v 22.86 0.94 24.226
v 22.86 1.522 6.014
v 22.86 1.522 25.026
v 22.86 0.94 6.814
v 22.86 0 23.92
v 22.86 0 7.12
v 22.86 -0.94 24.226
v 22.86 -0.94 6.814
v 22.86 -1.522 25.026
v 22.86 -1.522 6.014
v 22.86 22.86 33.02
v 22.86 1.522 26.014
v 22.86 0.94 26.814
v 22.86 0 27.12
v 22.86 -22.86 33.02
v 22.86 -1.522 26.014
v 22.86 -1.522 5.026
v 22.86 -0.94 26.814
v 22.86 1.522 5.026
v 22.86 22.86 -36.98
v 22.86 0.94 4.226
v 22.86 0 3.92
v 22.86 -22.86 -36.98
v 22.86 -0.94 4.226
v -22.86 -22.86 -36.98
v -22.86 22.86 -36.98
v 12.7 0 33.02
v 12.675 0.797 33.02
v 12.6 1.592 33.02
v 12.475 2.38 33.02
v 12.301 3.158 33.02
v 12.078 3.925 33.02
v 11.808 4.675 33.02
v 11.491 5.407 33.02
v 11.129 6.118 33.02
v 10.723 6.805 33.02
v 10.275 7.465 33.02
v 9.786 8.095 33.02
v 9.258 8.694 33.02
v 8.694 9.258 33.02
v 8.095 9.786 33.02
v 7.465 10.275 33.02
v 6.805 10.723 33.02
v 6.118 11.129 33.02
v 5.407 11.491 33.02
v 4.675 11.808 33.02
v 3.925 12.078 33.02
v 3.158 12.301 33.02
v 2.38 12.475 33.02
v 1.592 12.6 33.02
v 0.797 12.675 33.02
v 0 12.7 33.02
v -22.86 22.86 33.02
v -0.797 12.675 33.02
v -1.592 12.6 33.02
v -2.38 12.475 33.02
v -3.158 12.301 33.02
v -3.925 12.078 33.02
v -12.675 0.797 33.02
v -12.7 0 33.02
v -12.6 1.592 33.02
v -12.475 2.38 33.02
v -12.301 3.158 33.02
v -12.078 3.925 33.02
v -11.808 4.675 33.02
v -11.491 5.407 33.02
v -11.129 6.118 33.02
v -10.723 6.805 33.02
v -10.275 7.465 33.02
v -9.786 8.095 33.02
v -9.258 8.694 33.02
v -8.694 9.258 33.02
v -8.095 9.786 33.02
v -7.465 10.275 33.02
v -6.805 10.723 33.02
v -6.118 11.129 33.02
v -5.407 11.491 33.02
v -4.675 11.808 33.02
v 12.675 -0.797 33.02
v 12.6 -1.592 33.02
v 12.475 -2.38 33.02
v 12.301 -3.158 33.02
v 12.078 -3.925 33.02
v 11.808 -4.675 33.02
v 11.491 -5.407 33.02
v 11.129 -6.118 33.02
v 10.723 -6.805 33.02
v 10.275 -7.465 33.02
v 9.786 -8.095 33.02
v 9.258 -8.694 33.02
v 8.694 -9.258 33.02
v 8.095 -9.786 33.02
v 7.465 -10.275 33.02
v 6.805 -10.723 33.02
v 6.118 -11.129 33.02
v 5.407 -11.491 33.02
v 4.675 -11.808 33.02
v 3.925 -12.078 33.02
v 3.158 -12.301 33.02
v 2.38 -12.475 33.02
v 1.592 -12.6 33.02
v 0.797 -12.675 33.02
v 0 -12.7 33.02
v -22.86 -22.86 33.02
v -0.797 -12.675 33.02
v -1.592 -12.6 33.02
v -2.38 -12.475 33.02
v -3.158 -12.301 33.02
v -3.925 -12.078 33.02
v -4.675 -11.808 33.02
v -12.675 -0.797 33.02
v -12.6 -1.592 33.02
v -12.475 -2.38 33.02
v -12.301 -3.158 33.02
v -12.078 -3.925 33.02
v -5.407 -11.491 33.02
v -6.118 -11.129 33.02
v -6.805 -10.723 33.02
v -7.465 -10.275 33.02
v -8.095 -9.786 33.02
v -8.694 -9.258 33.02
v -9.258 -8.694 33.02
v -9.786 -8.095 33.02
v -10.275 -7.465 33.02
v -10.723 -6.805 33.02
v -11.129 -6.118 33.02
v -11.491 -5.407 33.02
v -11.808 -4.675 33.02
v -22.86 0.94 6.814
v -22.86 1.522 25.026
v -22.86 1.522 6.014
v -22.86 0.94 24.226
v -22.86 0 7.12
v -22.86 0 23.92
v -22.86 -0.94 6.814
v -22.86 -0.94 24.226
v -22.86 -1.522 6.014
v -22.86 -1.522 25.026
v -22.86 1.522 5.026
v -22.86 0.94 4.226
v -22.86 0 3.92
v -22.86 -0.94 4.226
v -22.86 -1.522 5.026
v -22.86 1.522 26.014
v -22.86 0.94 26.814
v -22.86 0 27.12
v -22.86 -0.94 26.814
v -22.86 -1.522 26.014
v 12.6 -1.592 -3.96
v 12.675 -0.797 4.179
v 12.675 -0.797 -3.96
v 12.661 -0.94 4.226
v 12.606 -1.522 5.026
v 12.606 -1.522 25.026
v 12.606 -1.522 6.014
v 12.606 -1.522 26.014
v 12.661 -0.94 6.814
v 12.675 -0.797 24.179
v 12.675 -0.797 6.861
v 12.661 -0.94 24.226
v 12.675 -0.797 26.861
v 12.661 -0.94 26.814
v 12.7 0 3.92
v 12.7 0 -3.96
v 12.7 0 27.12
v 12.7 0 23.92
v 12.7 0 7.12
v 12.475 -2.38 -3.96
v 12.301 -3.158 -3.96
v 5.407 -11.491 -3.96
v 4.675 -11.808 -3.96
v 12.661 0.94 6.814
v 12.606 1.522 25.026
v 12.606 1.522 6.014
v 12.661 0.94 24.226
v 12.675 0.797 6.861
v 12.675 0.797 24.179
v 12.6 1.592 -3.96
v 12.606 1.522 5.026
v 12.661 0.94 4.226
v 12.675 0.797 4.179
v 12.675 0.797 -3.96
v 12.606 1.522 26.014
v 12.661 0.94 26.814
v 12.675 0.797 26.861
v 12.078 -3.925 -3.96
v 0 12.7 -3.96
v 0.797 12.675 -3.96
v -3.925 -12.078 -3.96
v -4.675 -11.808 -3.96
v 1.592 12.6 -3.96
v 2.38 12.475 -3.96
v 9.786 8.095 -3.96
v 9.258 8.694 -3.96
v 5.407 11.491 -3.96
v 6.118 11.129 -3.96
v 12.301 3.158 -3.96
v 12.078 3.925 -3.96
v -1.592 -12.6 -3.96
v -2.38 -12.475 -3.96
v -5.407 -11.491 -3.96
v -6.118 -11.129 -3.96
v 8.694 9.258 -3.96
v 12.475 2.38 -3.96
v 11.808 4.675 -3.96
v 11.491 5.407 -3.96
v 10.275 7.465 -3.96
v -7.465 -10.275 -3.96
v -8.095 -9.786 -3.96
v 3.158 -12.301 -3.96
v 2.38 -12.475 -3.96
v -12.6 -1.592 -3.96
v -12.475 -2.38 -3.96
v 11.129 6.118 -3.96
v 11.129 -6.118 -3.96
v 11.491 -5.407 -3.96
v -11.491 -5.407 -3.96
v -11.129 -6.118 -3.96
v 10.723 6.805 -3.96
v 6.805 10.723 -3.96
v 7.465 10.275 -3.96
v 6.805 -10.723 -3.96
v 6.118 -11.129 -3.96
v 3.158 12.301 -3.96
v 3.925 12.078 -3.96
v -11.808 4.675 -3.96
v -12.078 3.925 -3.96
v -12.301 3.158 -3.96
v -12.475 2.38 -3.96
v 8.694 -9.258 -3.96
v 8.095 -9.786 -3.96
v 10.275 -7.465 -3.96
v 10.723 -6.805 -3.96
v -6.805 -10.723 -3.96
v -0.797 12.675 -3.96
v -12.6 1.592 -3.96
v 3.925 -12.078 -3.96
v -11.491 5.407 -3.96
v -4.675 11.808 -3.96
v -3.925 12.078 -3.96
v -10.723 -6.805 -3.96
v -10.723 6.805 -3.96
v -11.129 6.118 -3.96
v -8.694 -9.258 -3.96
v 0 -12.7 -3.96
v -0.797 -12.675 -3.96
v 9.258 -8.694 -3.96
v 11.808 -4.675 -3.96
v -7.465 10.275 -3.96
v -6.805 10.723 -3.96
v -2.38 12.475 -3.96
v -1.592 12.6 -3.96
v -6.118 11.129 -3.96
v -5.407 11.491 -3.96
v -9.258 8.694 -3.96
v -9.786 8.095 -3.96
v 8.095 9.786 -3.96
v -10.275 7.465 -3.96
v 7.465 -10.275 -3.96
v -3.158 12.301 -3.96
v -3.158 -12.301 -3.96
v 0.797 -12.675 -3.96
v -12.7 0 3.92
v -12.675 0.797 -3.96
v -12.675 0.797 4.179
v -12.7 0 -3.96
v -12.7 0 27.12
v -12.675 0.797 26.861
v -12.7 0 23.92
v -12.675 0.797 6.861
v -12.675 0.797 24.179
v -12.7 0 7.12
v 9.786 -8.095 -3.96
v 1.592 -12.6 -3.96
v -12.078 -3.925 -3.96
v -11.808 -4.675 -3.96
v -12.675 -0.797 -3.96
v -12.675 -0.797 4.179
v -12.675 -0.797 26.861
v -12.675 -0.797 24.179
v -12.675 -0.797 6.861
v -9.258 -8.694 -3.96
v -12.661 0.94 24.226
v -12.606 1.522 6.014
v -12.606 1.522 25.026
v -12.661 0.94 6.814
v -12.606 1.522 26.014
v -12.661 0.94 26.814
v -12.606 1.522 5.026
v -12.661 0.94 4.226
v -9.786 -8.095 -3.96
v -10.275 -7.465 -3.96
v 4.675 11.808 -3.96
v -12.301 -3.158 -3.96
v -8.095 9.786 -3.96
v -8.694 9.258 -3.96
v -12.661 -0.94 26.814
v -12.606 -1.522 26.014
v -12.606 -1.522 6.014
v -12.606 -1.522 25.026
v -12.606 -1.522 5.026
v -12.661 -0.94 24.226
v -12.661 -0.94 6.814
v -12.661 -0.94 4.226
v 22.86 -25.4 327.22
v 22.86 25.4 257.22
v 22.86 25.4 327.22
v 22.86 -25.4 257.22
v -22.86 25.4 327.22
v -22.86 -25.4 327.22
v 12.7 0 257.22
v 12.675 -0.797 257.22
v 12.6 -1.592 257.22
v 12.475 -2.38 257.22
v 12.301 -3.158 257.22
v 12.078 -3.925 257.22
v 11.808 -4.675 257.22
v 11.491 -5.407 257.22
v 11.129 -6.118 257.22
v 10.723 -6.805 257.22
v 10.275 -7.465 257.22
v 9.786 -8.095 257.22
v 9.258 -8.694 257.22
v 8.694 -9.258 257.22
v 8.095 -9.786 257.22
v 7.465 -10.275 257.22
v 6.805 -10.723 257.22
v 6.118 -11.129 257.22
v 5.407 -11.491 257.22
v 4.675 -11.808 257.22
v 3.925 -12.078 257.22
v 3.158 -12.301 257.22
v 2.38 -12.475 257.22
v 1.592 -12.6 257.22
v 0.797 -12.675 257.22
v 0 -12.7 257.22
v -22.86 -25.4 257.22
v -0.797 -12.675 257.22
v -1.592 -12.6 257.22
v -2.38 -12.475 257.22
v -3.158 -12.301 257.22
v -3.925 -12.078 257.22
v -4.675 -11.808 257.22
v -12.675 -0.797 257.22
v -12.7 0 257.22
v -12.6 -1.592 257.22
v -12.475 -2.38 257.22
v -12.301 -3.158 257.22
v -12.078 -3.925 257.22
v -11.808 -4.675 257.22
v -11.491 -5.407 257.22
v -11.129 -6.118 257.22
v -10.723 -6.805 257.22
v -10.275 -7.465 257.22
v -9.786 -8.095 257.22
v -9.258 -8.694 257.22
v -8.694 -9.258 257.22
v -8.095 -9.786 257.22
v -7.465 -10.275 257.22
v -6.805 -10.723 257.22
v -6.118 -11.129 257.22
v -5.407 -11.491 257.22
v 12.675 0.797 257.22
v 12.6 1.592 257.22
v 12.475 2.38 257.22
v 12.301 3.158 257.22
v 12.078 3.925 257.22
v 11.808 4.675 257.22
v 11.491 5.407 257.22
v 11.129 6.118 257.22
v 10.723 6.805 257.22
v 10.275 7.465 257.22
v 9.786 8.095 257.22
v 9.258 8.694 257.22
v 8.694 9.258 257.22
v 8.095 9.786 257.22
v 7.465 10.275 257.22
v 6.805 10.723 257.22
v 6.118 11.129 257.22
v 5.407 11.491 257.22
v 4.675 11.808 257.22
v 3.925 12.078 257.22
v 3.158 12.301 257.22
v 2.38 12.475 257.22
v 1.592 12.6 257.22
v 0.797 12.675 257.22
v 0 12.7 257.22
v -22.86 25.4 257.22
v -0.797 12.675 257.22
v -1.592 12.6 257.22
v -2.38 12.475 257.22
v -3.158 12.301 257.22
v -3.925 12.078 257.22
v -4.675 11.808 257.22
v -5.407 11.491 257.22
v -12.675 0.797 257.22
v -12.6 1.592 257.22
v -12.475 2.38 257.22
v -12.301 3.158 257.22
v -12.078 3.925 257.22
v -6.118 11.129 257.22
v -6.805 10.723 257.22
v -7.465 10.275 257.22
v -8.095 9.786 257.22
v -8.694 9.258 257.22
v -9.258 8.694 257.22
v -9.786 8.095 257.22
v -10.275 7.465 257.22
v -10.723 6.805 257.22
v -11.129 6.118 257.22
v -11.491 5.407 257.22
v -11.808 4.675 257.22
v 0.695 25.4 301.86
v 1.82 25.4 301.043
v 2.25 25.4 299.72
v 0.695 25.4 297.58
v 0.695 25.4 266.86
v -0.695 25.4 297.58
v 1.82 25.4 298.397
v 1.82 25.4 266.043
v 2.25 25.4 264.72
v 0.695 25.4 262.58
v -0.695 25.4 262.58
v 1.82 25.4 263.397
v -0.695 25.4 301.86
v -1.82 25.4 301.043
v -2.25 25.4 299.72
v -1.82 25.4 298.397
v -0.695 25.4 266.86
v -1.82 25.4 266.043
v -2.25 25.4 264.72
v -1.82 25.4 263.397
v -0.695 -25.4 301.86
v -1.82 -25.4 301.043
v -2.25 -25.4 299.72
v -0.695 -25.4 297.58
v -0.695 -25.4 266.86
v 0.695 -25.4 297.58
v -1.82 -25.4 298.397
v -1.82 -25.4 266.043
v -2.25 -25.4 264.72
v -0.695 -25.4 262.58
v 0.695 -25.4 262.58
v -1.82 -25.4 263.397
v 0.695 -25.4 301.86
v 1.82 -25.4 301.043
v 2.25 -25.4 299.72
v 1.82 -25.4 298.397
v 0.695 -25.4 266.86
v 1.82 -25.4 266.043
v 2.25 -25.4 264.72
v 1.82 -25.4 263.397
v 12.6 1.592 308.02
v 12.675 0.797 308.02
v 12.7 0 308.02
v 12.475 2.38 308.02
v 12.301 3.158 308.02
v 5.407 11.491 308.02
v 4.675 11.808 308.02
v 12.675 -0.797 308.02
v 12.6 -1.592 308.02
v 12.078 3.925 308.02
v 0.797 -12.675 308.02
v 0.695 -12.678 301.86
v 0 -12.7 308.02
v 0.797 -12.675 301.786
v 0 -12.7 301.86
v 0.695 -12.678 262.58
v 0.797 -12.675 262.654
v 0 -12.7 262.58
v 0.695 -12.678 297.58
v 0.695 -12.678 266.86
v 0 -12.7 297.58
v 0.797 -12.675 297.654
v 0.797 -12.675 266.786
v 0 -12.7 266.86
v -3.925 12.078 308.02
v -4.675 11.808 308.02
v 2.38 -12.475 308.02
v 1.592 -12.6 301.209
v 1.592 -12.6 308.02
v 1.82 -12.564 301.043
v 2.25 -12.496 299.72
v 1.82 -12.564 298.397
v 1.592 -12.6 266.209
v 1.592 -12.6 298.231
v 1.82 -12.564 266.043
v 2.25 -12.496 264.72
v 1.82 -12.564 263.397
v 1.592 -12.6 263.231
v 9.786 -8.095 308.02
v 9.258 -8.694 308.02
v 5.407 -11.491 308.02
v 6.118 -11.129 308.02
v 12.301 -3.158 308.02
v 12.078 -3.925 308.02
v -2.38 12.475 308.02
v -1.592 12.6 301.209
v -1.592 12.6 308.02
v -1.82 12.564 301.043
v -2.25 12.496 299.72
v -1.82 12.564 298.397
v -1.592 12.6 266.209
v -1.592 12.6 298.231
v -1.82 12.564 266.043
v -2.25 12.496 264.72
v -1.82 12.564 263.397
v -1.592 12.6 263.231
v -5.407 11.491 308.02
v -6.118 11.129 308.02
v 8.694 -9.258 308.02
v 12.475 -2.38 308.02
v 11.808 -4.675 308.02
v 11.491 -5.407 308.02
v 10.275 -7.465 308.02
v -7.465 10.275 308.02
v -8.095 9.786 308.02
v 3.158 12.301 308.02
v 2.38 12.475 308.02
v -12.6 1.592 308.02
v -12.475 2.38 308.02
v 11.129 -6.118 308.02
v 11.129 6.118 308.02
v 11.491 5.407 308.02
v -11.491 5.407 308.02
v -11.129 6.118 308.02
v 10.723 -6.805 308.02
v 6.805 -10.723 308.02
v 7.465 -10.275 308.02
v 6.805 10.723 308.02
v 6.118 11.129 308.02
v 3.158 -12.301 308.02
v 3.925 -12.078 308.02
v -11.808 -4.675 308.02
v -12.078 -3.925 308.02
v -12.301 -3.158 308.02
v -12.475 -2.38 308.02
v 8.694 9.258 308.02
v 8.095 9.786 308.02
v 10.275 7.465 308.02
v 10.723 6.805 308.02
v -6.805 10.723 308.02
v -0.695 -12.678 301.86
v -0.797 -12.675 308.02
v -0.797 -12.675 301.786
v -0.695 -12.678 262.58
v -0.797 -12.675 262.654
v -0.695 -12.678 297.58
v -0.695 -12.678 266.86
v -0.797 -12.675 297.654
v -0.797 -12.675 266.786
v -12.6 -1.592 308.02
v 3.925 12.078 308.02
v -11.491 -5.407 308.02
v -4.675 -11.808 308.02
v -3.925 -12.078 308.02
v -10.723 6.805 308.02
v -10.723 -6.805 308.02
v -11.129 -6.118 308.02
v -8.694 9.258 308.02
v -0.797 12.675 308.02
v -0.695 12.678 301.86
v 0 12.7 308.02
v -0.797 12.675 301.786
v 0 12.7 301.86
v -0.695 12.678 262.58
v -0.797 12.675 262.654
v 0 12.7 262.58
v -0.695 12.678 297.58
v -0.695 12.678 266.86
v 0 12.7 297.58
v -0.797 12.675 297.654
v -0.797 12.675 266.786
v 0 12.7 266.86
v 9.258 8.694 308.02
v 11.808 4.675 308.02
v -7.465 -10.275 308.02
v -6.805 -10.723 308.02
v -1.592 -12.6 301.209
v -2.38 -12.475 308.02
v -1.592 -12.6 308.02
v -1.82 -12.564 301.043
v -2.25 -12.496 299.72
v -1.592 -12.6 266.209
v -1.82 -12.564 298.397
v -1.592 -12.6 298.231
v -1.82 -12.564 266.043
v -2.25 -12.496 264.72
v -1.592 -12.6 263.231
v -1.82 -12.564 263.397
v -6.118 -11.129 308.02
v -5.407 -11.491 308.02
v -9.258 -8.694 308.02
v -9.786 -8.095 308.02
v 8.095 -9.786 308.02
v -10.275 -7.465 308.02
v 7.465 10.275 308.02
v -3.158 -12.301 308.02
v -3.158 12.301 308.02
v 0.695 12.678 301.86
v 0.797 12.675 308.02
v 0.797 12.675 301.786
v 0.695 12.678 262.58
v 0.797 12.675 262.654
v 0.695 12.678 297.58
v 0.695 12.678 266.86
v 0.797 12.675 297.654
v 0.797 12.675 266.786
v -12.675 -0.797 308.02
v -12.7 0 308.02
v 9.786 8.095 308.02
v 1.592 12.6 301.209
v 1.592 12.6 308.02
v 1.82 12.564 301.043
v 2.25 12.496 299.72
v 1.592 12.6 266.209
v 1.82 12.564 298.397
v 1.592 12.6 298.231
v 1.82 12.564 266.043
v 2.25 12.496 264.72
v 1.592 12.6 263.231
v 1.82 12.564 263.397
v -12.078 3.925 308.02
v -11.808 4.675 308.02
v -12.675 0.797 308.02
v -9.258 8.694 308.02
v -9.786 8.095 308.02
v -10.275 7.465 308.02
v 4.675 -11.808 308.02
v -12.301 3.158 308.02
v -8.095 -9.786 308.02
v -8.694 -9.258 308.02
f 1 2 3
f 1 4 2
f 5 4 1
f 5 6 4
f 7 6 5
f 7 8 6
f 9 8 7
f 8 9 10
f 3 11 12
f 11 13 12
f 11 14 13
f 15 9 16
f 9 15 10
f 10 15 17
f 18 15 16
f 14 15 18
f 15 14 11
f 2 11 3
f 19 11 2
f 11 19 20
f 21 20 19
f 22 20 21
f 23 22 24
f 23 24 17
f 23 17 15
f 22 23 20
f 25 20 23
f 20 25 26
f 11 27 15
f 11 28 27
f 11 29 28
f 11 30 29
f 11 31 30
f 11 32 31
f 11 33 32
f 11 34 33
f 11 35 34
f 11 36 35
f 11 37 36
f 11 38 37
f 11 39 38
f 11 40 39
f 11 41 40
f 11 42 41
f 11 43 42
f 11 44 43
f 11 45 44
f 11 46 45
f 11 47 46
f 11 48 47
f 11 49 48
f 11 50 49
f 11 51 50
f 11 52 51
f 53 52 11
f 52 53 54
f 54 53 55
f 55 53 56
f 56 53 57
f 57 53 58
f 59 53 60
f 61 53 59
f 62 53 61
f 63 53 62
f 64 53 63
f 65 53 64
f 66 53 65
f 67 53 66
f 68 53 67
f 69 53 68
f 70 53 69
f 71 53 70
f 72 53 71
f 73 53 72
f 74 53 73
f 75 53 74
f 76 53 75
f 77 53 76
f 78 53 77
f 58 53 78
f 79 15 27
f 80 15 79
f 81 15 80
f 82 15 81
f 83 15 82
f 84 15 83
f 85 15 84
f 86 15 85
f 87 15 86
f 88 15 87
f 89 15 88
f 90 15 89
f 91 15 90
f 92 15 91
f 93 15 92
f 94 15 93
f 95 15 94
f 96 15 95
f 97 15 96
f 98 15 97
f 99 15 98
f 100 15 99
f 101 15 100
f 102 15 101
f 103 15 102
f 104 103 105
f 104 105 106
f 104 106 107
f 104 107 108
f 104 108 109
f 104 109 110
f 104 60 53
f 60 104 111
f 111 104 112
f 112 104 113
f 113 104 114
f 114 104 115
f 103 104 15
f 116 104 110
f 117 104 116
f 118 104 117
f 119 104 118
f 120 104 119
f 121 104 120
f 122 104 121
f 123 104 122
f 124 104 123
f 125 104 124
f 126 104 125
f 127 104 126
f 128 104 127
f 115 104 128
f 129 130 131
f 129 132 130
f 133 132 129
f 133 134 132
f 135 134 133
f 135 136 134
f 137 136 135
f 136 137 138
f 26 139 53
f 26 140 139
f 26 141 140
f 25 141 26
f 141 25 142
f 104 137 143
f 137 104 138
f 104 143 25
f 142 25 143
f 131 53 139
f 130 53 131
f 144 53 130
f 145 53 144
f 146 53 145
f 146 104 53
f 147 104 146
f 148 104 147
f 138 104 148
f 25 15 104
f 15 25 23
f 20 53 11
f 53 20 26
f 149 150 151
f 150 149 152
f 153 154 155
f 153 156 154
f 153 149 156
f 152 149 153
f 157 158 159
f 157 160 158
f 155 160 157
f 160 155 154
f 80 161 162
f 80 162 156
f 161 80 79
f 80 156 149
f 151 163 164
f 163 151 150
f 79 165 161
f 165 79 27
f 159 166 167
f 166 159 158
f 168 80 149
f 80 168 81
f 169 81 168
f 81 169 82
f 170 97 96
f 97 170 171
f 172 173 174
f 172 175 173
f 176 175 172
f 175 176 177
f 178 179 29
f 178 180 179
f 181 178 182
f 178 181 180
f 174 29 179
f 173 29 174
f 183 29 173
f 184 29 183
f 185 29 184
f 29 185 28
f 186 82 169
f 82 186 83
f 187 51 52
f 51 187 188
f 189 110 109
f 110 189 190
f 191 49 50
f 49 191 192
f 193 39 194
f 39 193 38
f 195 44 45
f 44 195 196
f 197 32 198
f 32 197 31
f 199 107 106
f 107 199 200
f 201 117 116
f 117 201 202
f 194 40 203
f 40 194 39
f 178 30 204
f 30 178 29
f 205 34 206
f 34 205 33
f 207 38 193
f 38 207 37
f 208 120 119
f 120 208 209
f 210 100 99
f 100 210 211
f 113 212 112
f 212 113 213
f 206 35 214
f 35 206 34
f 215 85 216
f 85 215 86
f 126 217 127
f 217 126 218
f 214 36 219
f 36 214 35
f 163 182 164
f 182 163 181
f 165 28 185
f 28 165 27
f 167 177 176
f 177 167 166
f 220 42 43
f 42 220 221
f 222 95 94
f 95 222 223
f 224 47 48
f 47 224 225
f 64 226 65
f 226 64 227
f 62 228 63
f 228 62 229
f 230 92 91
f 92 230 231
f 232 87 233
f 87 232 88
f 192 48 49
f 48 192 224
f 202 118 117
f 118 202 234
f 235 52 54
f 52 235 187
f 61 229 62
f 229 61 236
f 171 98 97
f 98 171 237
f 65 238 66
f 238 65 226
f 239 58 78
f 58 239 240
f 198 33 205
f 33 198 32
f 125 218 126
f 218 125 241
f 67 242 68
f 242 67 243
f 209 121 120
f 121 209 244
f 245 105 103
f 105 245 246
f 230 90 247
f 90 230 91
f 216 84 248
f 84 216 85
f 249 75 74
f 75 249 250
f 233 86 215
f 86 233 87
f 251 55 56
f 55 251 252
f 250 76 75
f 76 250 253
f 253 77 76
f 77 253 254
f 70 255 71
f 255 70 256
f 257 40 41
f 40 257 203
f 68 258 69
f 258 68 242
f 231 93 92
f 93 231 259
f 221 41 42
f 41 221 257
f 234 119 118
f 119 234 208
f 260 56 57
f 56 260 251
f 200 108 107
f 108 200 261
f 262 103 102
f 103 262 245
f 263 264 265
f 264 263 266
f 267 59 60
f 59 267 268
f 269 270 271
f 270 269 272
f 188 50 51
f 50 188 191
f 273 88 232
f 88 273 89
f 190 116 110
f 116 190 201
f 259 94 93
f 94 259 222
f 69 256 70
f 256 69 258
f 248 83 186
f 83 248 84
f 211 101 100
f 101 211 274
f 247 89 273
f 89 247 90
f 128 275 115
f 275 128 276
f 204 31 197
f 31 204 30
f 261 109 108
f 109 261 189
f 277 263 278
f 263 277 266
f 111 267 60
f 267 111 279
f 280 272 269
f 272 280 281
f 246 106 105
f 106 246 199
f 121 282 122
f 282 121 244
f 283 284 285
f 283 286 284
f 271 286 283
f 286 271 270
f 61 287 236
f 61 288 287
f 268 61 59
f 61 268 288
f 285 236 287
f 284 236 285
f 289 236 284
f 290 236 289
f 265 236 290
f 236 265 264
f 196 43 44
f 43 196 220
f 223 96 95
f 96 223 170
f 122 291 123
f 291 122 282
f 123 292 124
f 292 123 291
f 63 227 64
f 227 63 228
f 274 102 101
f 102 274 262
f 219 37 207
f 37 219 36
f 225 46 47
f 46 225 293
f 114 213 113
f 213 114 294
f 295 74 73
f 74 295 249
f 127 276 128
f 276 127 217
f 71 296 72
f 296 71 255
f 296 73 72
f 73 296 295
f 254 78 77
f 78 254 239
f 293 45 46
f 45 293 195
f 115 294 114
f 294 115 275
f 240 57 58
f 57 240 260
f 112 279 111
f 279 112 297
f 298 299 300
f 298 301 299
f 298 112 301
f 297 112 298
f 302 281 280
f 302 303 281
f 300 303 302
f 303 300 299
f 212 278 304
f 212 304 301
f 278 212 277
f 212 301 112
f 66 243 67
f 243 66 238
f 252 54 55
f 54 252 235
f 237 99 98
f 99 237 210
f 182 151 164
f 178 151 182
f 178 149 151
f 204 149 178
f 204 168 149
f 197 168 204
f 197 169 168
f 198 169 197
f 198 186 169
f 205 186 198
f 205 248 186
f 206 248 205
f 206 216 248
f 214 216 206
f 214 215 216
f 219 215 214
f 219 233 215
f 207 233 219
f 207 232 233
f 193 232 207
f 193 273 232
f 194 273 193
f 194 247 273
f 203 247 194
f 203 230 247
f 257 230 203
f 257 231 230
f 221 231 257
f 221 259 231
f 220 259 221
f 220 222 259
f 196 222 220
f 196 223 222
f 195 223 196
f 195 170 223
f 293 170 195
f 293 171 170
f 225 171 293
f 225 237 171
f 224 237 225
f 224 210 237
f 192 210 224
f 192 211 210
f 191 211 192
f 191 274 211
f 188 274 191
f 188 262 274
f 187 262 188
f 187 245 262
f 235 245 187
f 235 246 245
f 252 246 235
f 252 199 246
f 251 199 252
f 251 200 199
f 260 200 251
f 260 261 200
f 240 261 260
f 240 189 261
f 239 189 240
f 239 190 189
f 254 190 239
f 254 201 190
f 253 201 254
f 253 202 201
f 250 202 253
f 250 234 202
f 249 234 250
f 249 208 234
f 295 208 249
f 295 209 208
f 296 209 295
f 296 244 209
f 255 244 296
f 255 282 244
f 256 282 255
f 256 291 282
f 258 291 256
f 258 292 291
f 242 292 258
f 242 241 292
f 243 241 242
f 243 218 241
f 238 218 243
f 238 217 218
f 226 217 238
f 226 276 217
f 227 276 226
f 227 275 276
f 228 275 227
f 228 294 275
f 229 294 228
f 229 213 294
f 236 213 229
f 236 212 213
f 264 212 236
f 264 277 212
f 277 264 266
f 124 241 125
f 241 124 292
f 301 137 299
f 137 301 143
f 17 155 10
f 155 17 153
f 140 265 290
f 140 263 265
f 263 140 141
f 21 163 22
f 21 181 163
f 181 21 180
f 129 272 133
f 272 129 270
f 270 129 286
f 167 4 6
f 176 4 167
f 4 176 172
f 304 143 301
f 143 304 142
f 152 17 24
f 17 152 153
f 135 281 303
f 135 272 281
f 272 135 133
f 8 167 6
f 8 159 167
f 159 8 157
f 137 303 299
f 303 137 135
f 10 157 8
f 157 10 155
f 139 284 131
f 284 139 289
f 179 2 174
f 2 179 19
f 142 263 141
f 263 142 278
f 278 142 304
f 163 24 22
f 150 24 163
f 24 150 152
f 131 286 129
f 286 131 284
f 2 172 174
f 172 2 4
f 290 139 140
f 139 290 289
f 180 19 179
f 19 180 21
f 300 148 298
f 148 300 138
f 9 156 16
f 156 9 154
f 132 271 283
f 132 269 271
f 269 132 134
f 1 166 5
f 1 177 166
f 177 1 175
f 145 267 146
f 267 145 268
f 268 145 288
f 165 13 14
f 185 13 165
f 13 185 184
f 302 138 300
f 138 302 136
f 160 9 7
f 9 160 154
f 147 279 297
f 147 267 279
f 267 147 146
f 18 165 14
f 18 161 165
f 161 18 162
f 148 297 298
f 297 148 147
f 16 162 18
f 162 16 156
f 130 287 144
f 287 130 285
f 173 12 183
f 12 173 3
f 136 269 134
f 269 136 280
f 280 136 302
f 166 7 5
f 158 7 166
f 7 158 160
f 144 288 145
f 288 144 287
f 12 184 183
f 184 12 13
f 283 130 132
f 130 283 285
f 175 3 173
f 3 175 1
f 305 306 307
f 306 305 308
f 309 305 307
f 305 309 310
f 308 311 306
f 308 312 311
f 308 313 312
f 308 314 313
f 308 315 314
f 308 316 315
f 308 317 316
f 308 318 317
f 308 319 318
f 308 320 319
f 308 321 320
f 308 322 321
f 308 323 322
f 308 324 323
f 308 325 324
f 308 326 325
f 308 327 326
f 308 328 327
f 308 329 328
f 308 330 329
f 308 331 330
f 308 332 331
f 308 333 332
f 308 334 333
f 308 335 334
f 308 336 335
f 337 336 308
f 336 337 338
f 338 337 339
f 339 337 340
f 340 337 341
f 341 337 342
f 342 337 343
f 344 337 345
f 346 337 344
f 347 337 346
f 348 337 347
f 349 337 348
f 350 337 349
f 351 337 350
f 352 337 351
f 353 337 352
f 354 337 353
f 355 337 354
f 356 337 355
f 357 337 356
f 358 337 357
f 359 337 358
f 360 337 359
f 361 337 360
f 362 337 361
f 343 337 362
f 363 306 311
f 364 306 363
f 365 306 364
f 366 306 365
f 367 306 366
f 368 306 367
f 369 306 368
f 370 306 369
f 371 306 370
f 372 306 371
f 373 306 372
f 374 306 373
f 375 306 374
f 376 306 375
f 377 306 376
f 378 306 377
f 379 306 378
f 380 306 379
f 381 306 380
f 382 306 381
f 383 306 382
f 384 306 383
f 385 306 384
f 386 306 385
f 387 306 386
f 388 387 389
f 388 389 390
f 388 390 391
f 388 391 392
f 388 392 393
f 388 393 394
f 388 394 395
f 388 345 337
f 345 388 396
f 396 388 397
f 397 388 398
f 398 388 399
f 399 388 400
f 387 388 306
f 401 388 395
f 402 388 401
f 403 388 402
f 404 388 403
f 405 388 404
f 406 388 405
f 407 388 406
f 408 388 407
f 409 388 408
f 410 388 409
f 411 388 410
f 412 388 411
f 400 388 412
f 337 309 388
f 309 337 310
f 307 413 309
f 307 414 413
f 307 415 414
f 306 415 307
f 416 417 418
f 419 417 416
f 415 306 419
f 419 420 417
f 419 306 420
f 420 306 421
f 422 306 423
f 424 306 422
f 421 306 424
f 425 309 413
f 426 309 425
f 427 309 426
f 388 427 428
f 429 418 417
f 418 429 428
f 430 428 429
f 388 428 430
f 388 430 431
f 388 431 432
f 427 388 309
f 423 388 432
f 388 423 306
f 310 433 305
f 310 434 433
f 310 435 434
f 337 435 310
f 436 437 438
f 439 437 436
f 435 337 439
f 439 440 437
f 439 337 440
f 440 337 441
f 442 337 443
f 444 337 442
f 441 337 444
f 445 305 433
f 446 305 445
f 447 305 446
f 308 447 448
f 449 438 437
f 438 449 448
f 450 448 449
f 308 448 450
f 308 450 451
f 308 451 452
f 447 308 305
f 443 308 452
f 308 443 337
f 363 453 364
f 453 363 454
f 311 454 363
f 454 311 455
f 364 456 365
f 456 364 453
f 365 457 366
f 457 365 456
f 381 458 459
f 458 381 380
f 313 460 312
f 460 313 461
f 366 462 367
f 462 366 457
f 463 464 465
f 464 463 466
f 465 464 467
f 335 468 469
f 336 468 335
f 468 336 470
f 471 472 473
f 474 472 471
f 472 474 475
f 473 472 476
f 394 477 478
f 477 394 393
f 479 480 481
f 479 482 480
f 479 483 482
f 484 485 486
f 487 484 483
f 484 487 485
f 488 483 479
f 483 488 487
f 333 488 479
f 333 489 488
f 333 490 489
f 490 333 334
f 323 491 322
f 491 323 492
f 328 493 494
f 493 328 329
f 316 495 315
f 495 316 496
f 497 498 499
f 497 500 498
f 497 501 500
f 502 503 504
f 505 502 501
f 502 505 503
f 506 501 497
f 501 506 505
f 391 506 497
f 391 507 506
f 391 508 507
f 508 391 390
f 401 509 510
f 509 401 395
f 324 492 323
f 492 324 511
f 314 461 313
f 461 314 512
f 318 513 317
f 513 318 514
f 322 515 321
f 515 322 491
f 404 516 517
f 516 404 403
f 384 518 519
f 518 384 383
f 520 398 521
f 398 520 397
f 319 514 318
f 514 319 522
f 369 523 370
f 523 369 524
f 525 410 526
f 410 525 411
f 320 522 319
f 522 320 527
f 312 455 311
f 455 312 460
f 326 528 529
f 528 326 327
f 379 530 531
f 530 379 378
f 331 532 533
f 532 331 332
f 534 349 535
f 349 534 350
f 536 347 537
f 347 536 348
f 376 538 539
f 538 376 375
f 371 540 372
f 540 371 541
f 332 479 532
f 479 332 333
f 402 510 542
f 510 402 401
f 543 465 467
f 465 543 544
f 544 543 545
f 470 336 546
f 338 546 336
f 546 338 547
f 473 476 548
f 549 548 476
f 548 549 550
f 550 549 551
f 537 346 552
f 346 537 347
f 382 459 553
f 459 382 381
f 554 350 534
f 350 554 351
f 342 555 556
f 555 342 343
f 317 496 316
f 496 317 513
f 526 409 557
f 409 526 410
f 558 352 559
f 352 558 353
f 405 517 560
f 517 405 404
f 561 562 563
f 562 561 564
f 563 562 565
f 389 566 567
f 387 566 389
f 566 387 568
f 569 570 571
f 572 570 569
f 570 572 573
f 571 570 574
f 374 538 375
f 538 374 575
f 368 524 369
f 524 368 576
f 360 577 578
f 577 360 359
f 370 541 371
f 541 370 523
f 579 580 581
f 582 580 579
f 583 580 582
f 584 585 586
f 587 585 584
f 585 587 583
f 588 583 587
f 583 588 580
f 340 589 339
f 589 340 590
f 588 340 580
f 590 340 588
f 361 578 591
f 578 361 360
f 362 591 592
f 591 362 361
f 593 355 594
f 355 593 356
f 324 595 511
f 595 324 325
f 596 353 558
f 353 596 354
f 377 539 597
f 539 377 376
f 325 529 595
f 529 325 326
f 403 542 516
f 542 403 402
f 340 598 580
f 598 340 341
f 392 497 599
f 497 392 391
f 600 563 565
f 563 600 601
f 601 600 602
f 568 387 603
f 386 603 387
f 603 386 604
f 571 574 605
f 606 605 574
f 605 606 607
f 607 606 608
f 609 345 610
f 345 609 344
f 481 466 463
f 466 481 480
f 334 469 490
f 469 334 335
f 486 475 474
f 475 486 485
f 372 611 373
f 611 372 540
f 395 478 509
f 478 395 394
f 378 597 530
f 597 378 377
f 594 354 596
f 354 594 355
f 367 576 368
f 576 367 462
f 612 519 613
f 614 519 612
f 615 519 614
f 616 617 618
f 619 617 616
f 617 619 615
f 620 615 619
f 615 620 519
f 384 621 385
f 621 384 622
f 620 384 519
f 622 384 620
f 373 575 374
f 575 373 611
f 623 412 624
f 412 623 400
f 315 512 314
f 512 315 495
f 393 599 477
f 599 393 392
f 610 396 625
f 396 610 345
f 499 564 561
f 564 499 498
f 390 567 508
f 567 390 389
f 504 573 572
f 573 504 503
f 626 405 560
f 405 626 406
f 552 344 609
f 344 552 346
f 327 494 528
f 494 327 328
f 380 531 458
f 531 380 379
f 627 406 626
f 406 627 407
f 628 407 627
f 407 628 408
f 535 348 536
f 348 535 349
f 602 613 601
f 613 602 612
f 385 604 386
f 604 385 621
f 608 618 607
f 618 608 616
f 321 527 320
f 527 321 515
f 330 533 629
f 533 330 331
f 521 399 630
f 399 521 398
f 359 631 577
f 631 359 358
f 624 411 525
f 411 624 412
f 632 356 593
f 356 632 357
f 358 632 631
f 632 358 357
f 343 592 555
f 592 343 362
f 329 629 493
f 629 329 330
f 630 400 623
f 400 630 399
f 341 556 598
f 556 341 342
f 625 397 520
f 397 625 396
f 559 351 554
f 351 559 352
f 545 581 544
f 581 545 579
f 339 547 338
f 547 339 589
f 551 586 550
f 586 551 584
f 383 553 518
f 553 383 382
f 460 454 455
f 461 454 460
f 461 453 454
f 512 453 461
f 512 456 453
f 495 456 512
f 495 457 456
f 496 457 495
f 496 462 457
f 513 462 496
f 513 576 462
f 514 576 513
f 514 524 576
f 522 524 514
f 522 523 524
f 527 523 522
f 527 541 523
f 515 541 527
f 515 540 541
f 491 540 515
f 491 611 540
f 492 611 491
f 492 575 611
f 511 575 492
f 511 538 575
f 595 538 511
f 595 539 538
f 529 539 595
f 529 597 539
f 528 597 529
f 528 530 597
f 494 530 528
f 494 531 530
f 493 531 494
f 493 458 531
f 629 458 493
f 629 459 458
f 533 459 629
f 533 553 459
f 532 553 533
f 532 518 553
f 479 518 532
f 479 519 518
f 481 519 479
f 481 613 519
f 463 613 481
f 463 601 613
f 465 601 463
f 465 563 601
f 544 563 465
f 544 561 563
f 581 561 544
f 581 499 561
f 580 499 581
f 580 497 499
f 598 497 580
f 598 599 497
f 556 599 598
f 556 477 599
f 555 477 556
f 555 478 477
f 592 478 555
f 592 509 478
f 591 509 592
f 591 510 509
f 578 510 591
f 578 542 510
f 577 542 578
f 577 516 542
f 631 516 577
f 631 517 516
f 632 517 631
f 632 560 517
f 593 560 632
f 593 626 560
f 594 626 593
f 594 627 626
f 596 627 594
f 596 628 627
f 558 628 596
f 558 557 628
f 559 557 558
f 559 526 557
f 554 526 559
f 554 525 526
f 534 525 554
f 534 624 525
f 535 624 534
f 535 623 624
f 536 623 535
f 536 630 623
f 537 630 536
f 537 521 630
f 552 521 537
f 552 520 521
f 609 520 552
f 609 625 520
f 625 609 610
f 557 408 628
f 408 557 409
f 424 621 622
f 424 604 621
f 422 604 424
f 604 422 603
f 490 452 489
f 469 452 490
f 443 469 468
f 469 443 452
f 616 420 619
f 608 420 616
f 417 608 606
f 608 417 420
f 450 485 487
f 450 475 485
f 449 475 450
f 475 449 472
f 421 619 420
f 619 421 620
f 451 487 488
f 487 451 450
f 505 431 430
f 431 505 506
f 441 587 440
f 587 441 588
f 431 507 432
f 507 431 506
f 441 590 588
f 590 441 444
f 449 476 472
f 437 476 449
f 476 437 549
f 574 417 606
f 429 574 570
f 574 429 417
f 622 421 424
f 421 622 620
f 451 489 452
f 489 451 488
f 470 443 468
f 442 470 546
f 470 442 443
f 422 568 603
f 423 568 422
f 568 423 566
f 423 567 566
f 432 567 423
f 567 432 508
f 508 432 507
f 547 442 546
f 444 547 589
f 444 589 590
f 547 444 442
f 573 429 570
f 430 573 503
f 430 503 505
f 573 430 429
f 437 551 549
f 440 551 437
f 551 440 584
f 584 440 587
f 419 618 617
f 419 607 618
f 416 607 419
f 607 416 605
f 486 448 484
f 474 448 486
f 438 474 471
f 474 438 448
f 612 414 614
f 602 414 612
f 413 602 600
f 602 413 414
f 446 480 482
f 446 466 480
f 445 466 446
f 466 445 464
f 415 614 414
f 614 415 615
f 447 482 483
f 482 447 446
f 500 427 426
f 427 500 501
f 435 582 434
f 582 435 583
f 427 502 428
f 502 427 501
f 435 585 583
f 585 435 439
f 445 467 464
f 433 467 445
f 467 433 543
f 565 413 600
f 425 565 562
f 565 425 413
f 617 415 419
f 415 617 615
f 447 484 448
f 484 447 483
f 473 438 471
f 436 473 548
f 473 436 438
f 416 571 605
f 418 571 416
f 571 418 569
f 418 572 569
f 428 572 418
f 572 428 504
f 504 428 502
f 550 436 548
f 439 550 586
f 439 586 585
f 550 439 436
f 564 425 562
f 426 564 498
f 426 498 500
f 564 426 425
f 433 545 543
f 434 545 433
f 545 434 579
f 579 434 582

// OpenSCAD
// file: ../Parameters.scad
//Main tube diameter - hole [mm]
main_tube_outer_diameter = 25.4;
main_tube_inner_diameter = 23.5;

//Tube for undercarriage - hole [mm]
tube_for_undercarriage_outer_diameter = 10.6;
tube_for_undercarriage_inner_diameter = 6;
global_clearance = 0.5;


//umístění podvozkových trubek

second_undercarriage_hole = main_tube_outer_diameter*2 + main_tube_outer_diameter/5 + main_tube_outer_diameter/2 + 170 + 160;

// Parameters of tube couplings
coupling_wall_thickness = main_tube_outer_diameter/5;  //width of coupling walls 
thickness_between_tubes = main_tube_outer_diameter/10;    // minimum distance between tubes in couplings

coupling_wall_thickness_undercarriage = tube_for_undercarriage_outer_diameter/3;
thickness_between_tubes_undercarriage = tube_for_undercarriage_outer_diameter/10;

//Screw diameter and nut for M4 [mm]
M4_screw_diameter=4.5;
Nut_height_M4 = 3.2;
Nut_diameter_M4 = 7.86;


//Screw diameter and nut for M3 [mm]
M3_screw_diameter = 3.2;
Nut_height_M3 = 1.7;	
Nut_diameter_M3 = 6.6; 


//The tube for help
Help_main_tube_outer = 25;
Help_main_tube_inner = 23; 
Help_tube_for_undercarriage_outer = 10;
Help_tube_for_undercarriage_inner = 5;


//main hull parameters

hull_drop_length = 580;
hull_wall_thickness = 0.8;
hull_y_size = 120;
hull_z_size = 150;
hull_x_size = 580;
hull_corner_radius = 4;
hull_airfoil_thickness= 35;  // thickness of drop generating airfoil in percent of lenght.
hull_scale_x = 1;
hull_scale_y = 1.5;
hull_scale_z = 1.5;

main_pilon_position = 170+68;
cover_pilon_position = 180;
height_of_vertical_tube = 275; //278mm je změřená délka trubky. 

//délka hlavní dlouhé trubky
length_of_main_tube = 920;
length_of_undercarriage_tube = 300;

ribbon_width = 5; // šířka vyztužovacích lemů. 

// šířka otvoru v přední části kapoty pro držák motoru.
width_of_engine_holder = 63;

//Top Cover Division - dělení horního krytu pro tisk
top_cover_division = [0, 50, 150, 280, 410, hull_x_size]; // upraveny seznam tak, aby deleni začinalo od nuly, což umožňí úplně automatické rozdělení.

//Bottom Cover Division - dělení dolního krytu pro tisk
bottom_cover_division = [0,100,232.5,365, 470, hull_x_size];
// zkrácená část pro payload pro testovací tisk
//bottom_cover_division = [0,200,250,365, 470, hull_x_size];

//Base Divison - dělení podložky
base_division = [0, 140, main_pilon_position - (3*main_tube_outer_diameter)/2 + 3 * main_tube_outer_diameter,second_undercarriage_hole - main_tube_outer_diameter/2 - coupling_wall_thickness + main_tube_outer_diameter+2*(main_tube_outer_diameter/5) + global_clearance, hull_x_size];

//Cover pilon division - na výšku (v ose Z)
cover_pilon_division = [0,170,height_of_vertical_tube + main_tube_outer_diameter + coupling_wall_thickness];

//pozice šroubů
	//horní kryt
top_screw_position = [0, (top_cover_division[0] + top_cover_division[1])/4, (top_cover_division[2] - top_cover_division[1])/2 + top_cover_division[1], (top_cover_division[3] - top_cover_division[2])/2 + top_cover_division[2],(top_cover_division[4] - top_cover_division[3])/8 + top_cover_division[3],(top_cover_division[5] - top_cover_division[4])/2 + top_cover_division[4] - 20];
	//spodní kryt
bottom_screw_position = [0,(bottom_cover_division[0] + bottom_cover_division[1])/15 + 5, bottom_cover_division[1]/1.1, + bottom_cover_division[3], bottom_cover_division[3] + bottom_cover_division[1]/1.5];




//šířka zámků
lock_width = 10;

//délka zámků
lock_length = 3;


//accumulator
//základní rozměry akumulátoru
width_of_accumulator = 129.4;//45+1;
depth_of_accumulator = 40.61;
height_of_accumulator = 43.65;
//Zapuštění akumulátoru
sink_of_accumulator = 5; //main_tube_outer_diameter/5 - Nut_height_M3*1.5;

//tloušťka hrany spojky
accumulator_holder_width = 18; 
accumulator_holder_thickness = 10; 

//posunutí akumálátoru na podložce
move_of_accumulator = 165;   // pozice akumulátoru (ovlivňuje těžiště)


////////////////
// Senzory
///////////////////

//opticalFlow
    width_optical_flow_senzor = 45.5;
    depth_optical_flow_senzor = 6;
    height_optical_flow_senzor = 35;
    sink_of_optical_flow_senzor = depth_optical_flow_senzor - 5; 
    M3_optical_flow_senzor_Z = 30.4;
    M3_optical_flow_senzor_X = 24;
    M3_optical_flow_senzor_Z_alone = 9.1;
    M3_optical_flow_senzor_X_alone = 16.7;
// file: lib/naca4.scad
// Naca4.scad - library for parametric airfoils of 4 digit NACA series
// Code: Rudolf Huttary, Berlin 
// June 2015
// commercial use prohibited


// general use: for more examples refer to sampler.scad
// naca = naca digits or 3el vector  (default = 12 or [0, 0, .12])
// L    = chord length [mm]      (default= 100)
// N    = # sample points        (default= 81)
// h    = height [mm]            (default= 1)
// open = close at the thin end? (default = true)
// two equivalent example calls
 airfoil(naca = 2408, L = 60, N=1001, h = 30, open = false); 
// airfoil(naca = [.2, .4, .32], L = 60, N=1001, h = 30, open = false); 

module help()
{
  echo(str("\n\nList of signatures in lib:\n=================\n", 
  "module airfoil(naca=2412, L = 100, N = 81, h = 1, open = false) - renders airfoil object\n", 
  "module airfoil(naca=[.2, .4, .12], L = 100, N = 81, h = 1, open = false) - renders airfoil object using percentage for camber,  camber distance and thicknes\n", 
  "function airfoil_data(naca=12, L = 100, N = 81, open = false)\n",
  "=================\n")); 
}

help(); 
// this is the object
module airfoil(naca=12, L = 100, N = 81, h = 1, open = false)
{
  linear_extrude(height = h)
  polygon(points = airfoil_data(naca, L, N, open)); 
}

// this is the main function providing the airfoil data
function airfoil_data(naca=12, L = 100, N = 81, open = false) = 
  let(Na = len(naca)!=3?NACA(naca):naca)
  let(A = [.2969, -0.126, -.3516, .2843, open?-0.1015:-0.1036])
  [for (b=[-180:360/(N):179.99]) 
    let (x = (1-cos(b))/2)  
    let(yt = sign(b)*Na[2]/.2*(A*[sqrt(x), x, x*x, x*x*x, x*x*x*x])) 
    Na[0]==0?L*[x, yt]:L*camber(x, yt, Na[0], Na[1], sign(b))];  


function trailing_edge_angle(naca=12, open = false) = 
  let(Na = len(naca)!=3?NACA(naca):naca)
  let(A = [.2969, -0.126, -.3516, .2843, open?-0.1015:-0.1036])
  let (x =0.999)  // set x near to airfoil trailing edge
  let(yt = Na[2]/.2*(A*[sqrt(x), x, x*x, x*x*x, x*x*x*x])) // calculate distance from x-axis at previously set position
  atan2(yt,1-x);  // calculate angle of triangle between end of airfoil. The triange height corresponds to previously calculated distance from x-axis

// helper functions
function NACA(naca) = 
  let (M = floor(naca/1000))
  let (P = floor((naca-M*1000)/100)) 
  [M/100, P/10, floor(naca-M*1000-P*100)/100];  

function camber(x, y, M, P, upper) = 
  let(yc = (x<P)?M/P/P*(2*P*x-x*x): M/(1-P)/(1-P)*(1 - 2*P + 2*P*x -x*x))
  let(dy = (x<P)?2*M/P/P*(P-x):2*M/(1-P)/(1-P)*(P-x))
  let(th = atan(dy))
  [upper ? x - y*sin(th):x + y*sin(th), upper ? yc + y*cos(th):yc - y*cos(th)];
// main file
draft = true;   // sets rendering quality to draft.
$fs = draft ? 5 : 0.5;
$fa = 10;

module 888_1007(){

width=main_tube_outer_diameter+4*coupling_wall_thickness;
depth=width;
height= 70; //main_tube_outer_diameter*1.8+main_tube_outer_diameter+wall_thickness;

//666_1017
translate([0,0,+ coupling_wall_thickness + main_tube_outer_diameter + thickness_between_tubes])
	rotate([180,0,0])
		
		difference () {
			translate([-(width/2),-(width/2),0])
	   				cube ([width,depth,height]);
    		//vertical tube
    		translate ([0,0, - thickness_between_tubes])
        			cylinder(h = height - coupling_wall_thickness - main_tube_outer_diameter,r = main_tube_outer_diameter/2, $fn = draft ? 100 : 200);

			//screws
 			translate([- 2.5 * main_tube_outer_diameter,0,27.5])
        		rotate([0,90,0])
            		cylinder(h = 5*main_tube_outer_diameter, r = M3_screw_diameter/2, $fn = draft ? 10 : 20);

 			translate([- 2.5 * main_tube_outer_diameter,0,7.5])
        		rotate([0,90,0])
            		cylinder(h = 5*main_tube_outer_diameter, r = M3_screw_diameter/2, $fn = draft ? 10 : 20);
		}

//666_1026
translate([0,0, + height_of_vertical_tube - 2*main_tube_outer_diameter + coupling_wall_thickness + main_tube_outer_diameter + thickness_between_tubes])
   difference (){

        translate([-(width/2),-main_tube_outer_diameter,0])
            cube ([width,2*main_tube_outer_diameter,height]);
    	
    	//tube
    	translate([0,0,- global_clearance])
    	   cylinder(h = 2*main_tube_outer_diameter + global_clearance,r = main_tube_outer_diameter/2,$fn = draft ? 100 : 200);

    	//screw
    	translate([0,2.5 * main_tube_outer_diameter,7.5])
    	   rotate([90,0,0])
    	       cylinder(h= 5 *main_tube_outer_diameter, r = M4_screw_diameter/2, $fn = draft ? 10 :20);


    	translate([0,2.5 * main_tube_outer_diameter,42.5])
    	   rotate([90,0,0])
    	       cylinder(h = 5 * main_tube_outer_diameter, r = M4_screw_diameter/2, $fn = draft ? 10 : 20);
    	
    }

//trubka
//cylinder (h = height_of_vertical_tube, r = main_tube_outer_diameter/2, $fn = draft ? 100 : 200);



//final module
}


888_1007();

use <./lib/naca4.scad>
include <../Parameters.scad>
